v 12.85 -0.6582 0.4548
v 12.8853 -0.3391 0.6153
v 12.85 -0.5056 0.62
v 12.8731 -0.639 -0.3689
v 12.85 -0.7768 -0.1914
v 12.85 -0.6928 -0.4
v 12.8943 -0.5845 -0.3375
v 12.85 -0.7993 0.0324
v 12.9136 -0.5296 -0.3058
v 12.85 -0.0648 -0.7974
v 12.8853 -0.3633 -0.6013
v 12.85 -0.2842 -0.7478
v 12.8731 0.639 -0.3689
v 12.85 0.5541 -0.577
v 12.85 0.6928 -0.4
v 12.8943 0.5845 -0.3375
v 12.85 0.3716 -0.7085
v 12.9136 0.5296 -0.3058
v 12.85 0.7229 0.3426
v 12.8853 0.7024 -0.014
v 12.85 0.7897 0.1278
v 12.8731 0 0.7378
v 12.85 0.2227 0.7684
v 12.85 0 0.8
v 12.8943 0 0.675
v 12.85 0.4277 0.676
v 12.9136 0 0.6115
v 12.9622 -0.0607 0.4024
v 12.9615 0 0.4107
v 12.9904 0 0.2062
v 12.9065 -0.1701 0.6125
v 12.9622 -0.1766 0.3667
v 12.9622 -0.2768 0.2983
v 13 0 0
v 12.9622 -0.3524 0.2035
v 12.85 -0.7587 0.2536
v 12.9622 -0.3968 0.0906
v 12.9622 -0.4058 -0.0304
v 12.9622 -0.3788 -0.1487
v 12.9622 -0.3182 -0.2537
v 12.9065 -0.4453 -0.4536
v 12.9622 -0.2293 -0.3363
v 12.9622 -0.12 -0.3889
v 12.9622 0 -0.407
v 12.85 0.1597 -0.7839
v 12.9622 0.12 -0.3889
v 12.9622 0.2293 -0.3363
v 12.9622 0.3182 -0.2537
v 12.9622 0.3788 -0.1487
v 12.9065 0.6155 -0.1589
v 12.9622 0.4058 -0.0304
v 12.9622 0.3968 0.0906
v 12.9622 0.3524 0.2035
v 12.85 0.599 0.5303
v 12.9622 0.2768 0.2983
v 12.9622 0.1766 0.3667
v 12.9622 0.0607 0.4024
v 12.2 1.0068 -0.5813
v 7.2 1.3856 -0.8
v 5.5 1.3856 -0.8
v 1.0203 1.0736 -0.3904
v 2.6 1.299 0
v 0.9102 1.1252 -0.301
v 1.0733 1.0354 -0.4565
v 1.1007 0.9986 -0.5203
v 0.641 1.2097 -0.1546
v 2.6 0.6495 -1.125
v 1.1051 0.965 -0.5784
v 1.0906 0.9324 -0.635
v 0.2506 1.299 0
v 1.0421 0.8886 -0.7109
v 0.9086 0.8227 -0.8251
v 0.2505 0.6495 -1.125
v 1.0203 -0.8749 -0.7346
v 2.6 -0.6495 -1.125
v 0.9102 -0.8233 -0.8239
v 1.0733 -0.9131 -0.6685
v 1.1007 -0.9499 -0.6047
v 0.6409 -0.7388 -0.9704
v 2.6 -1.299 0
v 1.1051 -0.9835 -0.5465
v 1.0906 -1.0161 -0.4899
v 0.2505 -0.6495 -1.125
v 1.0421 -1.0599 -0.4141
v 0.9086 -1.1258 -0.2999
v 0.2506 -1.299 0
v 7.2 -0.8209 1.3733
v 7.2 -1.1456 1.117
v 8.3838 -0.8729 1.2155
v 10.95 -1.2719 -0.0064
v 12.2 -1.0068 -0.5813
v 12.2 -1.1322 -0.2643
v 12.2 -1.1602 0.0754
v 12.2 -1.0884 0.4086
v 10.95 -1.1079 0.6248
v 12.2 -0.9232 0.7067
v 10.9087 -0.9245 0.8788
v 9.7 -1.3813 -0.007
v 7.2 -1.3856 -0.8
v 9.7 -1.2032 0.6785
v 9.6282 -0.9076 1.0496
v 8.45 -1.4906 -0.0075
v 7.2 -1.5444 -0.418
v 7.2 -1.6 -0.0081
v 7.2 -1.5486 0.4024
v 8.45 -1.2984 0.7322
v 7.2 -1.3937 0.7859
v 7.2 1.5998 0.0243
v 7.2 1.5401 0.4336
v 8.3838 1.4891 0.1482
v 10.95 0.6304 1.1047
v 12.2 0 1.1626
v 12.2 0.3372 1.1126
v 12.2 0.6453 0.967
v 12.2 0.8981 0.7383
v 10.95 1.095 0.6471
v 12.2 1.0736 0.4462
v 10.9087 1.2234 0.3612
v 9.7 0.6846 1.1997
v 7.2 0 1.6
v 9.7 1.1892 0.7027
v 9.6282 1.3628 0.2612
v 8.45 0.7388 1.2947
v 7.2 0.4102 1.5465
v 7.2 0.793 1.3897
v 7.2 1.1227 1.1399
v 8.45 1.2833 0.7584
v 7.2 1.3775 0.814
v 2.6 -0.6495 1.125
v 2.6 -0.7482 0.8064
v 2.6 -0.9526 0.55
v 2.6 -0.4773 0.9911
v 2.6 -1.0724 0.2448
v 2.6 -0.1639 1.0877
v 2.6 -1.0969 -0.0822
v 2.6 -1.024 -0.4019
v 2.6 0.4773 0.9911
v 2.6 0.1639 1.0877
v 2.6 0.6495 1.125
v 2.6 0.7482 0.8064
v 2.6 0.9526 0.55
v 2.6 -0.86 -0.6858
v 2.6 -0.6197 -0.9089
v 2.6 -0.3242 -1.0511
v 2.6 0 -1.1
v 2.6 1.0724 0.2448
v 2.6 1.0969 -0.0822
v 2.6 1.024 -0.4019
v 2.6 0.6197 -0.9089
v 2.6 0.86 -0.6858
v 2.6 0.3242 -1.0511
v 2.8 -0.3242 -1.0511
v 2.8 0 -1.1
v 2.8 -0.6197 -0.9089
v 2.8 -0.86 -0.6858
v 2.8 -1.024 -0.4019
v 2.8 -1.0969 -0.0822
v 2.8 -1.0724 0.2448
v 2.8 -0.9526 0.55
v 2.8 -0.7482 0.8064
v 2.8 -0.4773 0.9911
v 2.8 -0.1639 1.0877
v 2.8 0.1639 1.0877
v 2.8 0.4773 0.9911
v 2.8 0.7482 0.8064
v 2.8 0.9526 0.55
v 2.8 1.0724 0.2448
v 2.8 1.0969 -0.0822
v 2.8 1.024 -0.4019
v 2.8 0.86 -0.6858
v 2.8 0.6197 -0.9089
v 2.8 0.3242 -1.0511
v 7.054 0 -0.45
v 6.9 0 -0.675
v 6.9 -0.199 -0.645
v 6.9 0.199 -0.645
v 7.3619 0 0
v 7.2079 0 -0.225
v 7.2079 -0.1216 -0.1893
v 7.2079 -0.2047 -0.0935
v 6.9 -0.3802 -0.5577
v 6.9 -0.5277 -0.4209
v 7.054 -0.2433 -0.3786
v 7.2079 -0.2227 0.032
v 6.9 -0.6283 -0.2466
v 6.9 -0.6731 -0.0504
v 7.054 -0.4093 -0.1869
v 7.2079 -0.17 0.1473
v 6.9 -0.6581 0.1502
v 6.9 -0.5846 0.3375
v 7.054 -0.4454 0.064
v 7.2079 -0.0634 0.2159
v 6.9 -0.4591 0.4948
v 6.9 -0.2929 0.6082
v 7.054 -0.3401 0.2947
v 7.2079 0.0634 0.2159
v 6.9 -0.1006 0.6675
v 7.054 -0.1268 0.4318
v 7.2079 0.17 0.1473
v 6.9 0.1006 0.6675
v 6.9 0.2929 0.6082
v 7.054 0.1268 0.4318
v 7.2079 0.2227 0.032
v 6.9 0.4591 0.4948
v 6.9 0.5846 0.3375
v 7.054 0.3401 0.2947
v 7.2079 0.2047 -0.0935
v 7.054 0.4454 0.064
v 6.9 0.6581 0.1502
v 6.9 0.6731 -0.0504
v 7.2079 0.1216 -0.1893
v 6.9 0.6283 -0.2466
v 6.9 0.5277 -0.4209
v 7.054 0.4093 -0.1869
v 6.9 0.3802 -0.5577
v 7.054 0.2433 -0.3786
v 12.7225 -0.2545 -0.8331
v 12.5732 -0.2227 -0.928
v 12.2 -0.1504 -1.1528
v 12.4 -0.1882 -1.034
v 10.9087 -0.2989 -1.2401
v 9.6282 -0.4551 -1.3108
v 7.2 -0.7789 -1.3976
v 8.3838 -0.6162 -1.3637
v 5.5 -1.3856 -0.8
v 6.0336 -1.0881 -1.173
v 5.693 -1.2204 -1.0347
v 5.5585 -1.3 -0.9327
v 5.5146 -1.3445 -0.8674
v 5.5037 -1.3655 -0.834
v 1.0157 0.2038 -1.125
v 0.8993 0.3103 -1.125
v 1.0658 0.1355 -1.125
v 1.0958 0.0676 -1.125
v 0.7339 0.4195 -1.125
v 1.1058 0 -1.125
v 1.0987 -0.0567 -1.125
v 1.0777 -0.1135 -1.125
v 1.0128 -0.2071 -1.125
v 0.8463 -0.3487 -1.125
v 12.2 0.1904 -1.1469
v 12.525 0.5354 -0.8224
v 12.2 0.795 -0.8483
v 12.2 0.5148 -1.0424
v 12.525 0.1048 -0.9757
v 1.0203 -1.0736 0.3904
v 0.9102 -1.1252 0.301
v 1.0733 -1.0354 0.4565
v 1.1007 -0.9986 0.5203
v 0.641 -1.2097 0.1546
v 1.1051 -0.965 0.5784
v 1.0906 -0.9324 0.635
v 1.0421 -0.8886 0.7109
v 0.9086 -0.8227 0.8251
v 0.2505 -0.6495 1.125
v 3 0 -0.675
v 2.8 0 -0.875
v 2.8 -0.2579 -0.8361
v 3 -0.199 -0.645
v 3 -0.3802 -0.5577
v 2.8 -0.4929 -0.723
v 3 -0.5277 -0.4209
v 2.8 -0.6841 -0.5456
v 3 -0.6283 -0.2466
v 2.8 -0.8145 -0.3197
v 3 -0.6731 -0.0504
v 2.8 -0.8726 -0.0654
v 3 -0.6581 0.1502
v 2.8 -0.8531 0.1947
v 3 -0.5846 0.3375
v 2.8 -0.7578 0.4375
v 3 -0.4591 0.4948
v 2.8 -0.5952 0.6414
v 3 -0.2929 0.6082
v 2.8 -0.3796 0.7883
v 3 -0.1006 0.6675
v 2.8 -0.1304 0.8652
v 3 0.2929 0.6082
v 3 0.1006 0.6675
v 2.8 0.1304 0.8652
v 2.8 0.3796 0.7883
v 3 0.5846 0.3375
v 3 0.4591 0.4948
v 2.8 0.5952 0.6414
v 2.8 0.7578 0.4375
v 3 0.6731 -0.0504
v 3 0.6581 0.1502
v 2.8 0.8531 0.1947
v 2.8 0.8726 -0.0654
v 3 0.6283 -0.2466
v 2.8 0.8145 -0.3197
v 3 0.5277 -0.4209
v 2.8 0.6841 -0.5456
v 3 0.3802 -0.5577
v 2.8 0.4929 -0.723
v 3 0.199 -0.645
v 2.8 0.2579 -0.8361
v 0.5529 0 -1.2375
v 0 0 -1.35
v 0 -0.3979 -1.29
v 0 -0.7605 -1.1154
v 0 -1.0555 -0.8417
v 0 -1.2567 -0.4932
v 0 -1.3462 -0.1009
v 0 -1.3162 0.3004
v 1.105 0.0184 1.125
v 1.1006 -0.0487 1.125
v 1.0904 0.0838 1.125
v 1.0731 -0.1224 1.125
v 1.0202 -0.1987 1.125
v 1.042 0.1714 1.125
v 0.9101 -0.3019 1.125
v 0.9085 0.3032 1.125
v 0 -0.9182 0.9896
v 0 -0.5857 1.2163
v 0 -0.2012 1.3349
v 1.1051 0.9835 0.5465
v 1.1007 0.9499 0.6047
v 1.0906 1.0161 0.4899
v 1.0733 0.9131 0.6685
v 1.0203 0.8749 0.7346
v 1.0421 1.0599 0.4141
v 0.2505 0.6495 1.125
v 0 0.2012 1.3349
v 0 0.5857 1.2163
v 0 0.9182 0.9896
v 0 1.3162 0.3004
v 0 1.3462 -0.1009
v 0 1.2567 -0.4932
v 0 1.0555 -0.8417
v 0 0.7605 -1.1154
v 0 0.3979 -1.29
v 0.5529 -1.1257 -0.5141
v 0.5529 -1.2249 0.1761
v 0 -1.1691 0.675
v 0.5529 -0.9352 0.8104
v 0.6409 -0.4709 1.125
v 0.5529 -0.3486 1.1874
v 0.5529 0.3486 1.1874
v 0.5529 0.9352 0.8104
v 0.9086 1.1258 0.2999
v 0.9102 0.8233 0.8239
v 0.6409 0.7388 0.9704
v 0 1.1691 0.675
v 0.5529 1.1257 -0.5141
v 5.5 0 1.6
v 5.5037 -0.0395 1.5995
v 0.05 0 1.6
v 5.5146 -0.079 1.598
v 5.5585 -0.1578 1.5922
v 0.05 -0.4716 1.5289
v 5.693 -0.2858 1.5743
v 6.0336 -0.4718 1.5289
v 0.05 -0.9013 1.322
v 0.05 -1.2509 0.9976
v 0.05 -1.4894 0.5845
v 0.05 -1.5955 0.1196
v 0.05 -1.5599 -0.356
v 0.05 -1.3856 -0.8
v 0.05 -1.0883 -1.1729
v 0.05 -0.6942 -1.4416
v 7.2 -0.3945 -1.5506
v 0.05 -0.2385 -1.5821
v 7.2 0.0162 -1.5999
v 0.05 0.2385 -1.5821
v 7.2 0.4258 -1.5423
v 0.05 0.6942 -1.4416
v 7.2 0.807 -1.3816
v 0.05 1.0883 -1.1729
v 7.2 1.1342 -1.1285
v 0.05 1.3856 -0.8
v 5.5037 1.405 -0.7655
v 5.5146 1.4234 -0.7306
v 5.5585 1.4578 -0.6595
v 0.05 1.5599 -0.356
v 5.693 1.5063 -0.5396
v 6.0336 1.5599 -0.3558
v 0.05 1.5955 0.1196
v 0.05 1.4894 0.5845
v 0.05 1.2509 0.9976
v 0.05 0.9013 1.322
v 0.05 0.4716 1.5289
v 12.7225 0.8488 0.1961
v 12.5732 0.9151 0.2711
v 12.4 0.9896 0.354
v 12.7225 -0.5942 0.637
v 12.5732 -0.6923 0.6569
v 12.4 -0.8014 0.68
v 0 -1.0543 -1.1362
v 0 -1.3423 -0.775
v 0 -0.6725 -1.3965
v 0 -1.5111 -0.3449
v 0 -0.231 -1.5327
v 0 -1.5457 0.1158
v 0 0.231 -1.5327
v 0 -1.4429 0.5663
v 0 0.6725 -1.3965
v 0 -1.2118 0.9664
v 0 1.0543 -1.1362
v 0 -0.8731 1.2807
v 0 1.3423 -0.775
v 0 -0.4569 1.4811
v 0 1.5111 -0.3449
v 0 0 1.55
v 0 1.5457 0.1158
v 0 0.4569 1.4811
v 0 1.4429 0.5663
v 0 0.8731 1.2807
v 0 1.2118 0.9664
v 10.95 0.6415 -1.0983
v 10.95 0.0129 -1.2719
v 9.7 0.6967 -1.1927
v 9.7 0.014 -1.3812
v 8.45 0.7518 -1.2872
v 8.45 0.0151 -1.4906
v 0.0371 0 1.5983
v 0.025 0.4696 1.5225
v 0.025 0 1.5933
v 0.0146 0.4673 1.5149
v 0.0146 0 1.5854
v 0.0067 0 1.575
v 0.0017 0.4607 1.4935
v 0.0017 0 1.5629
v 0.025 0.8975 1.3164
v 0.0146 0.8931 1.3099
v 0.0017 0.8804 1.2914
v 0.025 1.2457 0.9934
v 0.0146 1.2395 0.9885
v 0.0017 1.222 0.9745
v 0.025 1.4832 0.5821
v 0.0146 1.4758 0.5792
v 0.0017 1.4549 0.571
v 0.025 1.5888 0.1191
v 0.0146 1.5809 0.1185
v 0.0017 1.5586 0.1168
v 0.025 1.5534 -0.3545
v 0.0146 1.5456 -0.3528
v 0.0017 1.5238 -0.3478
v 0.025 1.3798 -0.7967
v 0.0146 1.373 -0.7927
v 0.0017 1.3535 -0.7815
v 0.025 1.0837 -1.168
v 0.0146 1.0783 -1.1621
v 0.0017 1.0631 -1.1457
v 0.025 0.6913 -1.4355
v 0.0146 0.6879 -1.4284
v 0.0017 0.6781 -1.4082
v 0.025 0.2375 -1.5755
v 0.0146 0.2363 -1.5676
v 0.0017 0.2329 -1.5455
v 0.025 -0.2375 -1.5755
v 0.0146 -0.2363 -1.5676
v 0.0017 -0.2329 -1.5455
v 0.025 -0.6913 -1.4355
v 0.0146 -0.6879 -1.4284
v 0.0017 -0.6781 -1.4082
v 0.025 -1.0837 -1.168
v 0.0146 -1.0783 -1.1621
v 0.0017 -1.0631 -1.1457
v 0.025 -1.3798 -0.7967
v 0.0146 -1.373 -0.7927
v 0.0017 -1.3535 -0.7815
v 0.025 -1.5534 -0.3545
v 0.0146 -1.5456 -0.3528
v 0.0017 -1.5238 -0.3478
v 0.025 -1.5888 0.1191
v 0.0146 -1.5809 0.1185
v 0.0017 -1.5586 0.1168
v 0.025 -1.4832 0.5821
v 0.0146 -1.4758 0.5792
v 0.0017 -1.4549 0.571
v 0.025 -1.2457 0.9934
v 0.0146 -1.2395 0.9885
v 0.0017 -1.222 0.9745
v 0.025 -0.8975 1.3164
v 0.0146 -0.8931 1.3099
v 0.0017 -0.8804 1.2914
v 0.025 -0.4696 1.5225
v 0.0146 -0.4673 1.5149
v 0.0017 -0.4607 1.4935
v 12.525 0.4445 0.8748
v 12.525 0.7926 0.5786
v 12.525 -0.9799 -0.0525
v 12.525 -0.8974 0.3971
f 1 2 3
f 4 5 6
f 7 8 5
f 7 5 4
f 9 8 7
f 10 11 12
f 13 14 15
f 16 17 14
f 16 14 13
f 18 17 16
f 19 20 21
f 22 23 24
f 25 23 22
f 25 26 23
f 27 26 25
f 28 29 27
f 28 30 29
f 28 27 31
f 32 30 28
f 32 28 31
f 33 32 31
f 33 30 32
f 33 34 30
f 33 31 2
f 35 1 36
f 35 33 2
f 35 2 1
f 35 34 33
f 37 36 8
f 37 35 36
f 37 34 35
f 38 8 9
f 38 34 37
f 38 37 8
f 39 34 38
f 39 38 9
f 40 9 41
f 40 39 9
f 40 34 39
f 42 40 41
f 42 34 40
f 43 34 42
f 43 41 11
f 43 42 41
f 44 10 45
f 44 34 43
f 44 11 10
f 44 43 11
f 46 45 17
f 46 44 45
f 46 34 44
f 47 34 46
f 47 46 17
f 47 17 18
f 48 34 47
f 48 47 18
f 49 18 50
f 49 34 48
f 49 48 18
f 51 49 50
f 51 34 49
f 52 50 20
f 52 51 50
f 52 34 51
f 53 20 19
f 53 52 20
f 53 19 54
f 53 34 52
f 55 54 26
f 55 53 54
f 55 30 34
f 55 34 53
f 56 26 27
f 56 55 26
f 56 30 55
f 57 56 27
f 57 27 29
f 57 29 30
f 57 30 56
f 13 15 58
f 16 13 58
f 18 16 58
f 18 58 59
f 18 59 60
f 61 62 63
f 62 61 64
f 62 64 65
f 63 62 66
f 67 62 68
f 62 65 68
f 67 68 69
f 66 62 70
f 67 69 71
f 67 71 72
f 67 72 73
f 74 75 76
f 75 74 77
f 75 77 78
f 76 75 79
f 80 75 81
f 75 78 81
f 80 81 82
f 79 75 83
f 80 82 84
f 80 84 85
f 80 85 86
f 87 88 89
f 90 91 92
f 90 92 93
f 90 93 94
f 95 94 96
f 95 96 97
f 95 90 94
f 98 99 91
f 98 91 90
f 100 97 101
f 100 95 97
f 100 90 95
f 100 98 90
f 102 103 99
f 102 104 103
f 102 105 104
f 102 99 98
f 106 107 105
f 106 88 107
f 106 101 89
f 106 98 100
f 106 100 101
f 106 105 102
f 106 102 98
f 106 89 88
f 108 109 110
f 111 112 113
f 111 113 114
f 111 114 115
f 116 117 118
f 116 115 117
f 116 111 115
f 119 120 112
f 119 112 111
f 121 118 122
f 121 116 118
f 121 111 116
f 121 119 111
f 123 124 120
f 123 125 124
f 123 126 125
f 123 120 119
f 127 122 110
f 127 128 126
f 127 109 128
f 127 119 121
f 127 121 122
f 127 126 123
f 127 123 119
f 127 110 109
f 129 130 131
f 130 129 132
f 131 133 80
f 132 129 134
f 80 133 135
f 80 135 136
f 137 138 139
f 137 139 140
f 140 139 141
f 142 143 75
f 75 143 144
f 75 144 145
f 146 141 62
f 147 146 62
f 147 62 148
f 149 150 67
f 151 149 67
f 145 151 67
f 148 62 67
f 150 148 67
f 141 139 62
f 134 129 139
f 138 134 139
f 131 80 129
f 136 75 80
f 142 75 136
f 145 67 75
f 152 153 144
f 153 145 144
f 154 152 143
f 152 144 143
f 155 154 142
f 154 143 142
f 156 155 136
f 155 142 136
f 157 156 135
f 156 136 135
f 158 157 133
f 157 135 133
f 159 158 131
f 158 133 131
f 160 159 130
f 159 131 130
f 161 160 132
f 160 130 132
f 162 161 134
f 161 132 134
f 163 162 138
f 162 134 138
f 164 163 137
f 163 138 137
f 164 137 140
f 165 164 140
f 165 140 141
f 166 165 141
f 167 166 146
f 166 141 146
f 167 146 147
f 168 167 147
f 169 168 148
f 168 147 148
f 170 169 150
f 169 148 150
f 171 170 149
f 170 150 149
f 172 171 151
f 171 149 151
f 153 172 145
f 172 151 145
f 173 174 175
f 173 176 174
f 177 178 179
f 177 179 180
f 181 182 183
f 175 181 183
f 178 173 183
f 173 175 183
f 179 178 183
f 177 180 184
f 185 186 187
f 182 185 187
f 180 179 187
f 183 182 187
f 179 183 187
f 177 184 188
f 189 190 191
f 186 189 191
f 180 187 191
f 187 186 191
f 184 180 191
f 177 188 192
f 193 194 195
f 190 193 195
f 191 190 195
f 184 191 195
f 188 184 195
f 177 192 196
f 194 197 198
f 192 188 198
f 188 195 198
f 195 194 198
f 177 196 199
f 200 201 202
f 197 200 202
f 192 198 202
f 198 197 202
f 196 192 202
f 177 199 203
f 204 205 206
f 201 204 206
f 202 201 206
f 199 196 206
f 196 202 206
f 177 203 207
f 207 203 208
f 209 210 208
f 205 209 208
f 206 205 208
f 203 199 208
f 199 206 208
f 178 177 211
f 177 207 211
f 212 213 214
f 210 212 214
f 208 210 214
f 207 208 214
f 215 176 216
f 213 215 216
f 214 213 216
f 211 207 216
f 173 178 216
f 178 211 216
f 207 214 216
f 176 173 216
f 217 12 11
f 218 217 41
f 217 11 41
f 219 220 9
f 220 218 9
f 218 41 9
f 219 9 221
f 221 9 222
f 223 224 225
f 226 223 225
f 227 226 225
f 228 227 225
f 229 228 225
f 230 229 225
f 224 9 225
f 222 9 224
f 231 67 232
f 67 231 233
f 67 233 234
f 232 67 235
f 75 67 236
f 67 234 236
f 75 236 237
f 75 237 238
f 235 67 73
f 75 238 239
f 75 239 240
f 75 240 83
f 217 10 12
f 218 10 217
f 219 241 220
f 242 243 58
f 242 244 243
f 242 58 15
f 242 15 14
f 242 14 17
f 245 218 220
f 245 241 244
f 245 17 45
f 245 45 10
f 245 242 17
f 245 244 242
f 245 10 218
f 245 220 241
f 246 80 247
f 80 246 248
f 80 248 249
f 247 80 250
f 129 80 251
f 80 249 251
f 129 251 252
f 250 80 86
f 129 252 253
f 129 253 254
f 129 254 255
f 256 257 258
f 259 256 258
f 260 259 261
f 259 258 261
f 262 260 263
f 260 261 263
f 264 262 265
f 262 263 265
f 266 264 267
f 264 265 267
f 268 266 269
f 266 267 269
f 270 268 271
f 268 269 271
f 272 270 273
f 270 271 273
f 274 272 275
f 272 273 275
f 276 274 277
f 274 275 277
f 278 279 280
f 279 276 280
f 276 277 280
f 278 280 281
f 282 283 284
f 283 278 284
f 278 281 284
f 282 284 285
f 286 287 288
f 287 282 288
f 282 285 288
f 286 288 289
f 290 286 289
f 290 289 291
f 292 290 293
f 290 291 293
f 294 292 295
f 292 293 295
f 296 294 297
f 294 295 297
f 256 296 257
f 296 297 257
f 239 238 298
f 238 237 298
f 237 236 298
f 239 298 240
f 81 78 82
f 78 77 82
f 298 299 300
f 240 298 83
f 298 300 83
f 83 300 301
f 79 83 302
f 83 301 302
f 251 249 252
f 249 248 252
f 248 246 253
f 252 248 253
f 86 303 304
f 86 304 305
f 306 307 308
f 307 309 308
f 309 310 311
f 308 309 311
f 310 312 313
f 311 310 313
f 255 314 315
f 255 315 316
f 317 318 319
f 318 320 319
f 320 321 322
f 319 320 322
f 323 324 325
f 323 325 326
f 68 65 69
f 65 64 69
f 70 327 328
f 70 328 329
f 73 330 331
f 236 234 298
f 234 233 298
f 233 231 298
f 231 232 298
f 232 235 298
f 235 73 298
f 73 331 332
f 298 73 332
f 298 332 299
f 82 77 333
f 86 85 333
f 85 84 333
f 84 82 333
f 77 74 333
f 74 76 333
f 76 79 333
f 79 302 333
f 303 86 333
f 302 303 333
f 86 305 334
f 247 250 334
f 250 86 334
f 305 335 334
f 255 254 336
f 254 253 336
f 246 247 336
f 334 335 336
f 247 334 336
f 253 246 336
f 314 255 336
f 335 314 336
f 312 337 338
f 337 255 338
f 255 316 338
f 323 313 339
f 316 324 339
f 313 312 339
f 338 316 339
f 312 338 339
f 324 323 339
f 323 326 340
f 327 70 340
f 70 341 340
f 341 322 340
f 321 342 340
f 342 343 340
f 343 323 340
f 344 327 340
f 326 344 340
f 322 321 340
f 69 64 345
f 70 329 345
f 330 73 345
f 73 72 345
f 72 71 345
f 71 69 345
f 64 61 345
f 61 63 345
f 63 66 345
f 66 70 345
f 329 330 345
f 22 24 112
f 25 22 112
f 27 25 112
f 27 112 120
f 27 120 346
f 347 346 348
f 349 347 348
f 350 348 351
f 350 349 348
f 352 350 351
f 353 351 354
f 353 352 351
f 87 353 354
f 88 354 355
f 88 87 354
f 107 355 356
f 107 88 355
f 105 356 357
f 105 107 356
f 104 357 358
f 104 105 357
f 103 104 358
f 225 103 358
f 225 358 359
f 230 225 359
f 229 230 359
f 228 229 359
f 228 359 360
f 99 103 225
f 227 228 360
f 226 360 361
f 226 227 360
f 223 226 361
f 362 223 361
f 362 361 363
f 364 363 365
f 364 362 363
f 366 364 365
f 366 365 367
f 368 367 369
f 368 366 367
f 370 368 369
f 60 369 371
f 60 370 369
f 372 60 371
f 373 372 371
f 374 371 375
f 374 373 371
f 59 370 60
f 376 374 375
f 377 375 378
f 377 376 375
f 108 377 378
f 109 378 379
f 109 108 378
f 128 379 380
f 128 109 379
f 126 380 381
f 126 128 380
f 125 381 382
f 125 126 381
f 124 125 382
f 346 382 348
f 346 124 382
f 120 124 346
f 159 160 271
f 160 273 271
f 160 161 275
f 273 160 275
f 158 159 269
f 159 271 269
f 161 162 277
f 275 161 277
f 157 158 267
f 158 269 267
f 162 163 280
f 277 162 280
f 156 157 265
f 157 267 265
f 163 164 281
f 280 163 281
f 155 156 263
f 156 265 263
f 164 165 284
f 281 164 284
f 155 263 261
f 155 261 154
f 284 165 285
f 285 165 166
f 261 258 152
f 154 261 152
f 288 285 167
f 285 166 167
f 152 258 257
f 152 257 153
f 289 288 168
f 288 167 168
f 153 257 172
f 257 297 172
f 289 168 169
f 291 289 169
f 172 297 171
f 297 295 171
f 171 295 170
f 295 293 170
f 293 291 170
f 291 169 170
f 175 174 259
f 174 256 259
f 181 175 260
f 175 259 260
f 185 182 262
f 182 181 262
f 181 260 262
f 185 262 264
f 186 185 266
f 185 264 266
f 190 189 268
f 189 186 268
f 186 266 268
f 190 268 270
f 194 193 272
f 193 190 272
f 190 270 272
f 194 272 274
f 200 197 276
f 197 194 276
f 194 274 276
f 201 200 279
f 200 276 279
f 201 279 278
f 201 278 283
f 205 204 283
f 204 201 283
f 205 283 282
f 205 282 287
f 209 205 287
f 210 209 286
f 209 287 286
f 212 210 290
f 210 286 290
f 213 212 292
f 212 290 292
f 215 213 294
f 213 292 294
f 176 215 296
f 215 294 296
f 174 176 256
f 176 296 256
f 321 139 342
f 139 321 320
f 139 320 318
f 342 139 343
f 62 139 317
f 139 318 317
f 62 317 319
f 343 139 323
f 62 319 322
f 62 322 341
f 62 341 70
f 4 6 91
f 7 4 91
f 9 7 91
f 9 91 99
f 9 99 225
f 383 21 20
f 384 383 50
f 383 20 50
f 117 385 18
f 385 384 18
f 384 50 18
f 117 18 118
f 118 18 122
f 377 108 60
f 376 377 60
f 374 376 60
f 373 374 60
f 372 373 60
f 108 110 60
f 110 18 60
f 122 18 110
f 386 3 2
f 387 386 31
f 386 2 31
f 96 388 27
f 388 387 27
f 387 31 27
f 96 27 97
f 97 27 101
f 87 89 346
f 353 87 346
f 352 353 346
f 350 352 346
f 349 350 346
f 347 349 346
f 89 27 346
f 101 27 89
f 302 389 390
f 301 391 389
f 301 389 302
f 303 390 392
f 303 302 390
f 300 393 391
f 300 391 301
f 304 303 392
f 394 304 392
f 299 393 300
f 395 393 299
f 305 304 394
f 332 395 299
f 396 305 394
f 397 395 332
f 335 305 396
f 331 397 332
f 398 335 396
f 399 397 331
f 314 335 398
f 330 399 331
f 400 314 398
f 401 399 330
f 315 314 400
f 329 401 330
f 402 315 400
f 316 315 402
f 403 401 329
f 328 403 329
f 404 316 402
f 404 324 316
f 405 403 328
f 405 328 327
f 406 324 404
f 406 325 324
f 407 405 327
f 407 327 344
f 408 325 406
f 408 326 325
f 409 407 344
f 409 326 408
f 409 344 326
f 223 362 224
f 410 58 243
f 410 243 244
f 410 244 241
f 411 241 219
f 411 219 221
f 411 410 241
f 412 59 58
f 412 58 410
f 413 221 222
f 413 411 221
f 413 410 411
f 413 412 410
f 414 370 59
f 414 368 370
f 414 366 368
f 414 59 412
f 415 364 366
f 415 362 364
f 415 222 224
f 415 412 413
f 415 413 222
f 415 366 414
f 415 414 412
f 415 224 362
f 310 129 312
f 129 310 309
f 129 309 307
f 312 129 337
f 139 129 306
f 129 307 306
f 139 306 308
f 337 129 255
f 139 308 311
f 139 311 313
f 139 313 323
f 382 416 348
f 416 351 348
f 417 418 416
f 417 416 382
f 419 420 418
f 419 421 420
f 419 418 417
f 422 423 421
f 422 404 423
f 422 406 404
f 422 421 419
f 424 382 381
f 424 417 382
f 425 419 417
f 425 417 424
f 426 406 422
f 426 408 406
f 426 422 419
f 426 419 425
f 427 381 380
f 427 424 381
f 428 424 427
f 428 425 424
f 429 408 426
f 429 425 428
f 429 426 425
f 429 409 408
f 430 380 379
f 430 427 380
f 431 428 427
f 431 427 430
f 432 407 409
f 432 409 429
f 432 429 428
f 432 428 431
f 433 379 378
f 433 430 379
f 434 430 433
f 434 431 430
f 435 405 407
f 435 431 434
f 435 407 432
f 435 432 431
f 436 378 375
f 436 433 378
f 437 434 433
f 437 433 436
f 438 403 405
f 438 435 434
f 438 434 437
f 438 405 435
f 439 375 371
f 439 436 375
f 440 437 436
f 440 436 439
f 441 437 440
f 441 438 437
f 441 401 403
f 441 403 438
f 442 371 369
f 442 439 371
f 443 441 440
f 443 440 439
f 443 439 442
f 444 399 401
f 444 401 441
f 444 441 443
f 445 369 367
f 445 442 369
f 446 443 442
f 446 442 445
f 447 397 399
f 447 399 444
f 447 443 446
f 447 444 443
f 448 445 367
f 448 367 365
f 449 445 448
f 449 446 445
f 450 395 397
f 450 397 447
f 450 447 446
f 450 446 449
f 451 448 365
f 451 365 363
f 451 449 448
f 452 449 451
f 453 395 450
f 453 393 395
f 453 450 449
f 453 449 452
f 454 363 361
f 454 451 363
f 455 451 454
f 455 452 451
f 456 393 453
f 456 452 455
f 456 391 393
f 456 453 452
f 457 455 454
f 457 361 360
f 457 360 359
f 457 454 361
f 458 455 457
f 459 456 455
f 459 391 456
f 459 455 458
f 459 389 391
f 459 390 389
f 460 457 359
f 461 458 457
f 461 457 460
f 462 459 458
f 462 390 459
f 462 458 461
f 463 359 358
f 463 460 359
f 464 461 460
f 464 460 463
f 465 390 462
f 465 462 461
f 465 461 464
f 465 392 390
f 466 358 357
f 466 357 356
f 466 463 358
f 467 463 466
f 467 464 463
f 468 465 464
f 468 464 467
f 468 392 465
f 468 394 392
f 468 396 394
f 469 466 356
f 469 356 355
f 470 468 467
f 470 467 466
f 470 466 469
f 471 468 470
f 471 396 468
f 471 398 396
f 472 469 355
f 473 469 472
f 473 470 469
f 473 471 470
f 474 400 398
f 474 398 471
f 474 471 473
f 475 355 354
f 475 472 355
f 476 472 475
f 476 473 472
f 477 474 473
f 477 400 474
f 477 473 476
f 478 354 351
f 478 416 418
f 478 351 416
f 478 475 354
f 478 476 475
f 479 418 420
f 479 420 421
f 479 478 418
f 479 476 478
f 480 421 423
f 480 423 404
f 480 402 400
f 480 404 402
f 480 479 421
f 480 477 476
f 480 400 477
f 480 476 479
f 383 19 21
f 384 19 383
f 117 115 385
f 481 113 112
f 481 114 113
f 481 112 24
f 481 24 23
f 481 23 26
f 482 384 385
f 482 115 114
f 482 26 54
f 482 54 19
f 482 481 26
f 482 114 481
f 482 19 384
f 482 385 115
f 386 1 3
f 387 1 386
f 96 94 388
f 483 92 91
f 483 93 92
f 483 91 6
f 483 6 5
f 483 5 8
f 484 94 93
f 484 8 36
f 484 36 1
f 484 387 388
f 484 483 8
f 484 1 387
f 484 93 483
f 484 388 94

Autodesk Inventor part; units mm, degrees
ref_plane "YZ Plane" through (0, 0, 0) normal (1, 0, 0) x (0, 1, 0)
ref_plane "XZ Plane" through (0, 0, 0) normal (0, 1, 0) x (-1, 0, 0)
ref_plane "XY Plane" through (0, 0, 0) normal (0, 0, 1) x (1, 0, 0)
sketch "Sketch1" plane through (0, 0, 0) normal (0, 1, 0) x (-1, 0, 0)
  line L0 (0, 0) -> (0, 1.6)
  line L1 (0, 1.6) -> (-7.2, 1.6)
  line L2 (-7.2, 1.6) -> (-12.2, 1.1626)
  line L3 (-12.7, 0.8837) -> (-12.7, 0)
  line L4 (-12.7, 0) -> (0, 0)
  line L5 (-12.7, 0) -> (-13, 0)
  line L6 (-12.2, 0) -> (-12.2, 1.1626)
  line L7 (-12.2, 1.1626) -> (-12.85, 0.8)
  line L8 (-12.2, -1.1626) -> (-12.85, -0.8)
  arc A0 (-12.85, 0.8) -> (-12.85, -0.8) centre (-10.7917, 0) ccw
  dimension "d0" = 1.6
  dimension "d1" = 7.2
  dimension "d3" = 12.7
  dimension "d4" = 0.3
  dimension "d352" = 0.8
  dimension "d353" = 0.8
  dimension "d355" = 0.65
  dimension "d359" = 5
  dimension "d373" = 60.848
revolve "Revolution1" add sketch "Sketch1" angle 360 about axis through (12.7, 0, 0) along (-1, 0, 0)
sketch "Sketch2" plane through (0, 0, 0) normal (0, 1, 0) x (-1, 0, 0)
  line L0 (0, -1.35) -> (0, 0)
  line L1 (0, 0) -> (-6.9, 0)
  line L2 (-6.9, 0) -> (-6.9, -0.675)
  line L3 (-6.9, -0.675) -> (-2.8, -0.675)
  line L4 (-2.8, -0.675) -> (-2.8, -1.1)
  line L5 (-2.8, -1.1) -> (-1.35, -1.1)
  line L6 (-1.35, -1.1) -> (-1.35, -1.0753)
  line L7 (-1.35, -1.0753) -> (0, -1.35)
  line L8 (-6.9, -0.675) -> (-7.3619, 0)
  line L9 (-7.3619, 0) -> (-6.9, 0) construction
  line L10 (-7.3619, 0) -> (-6.9, 0)
  line L11 (0, 0) -> (0, -1.425)
  line L12 (0, -1.6) -> (0, 1.6)
  line L13 (0, -1.425) -> (0.3686, -1.425)
  dimension "d9" = 1.1
  dimension "d11" = 1.35
  dimension "d12" = 11.5
  dimension "d145" = 0.4619
  dimension "d284" = 1.45
  dimension "d293" = 1.35
  dimension "d361" = 1.425
  dimension "d363" = 0.3686
  dimension "d367" = 6.9
  dimension "d374" = 0.675
revolve "Revolution2" cut sketch "Sketch2" angle 360 about axis through (0, 0, 0) along (1, 0, 0)
sketch "Sketch3" plane through (1.35, 0, 0) normal (1, 0, 0) x (0, 0, -1)
  line L0 (0, 1.299) -> (1.125, 0.6495)
  line L1 (1.125, 0.6495) -> (1.125, -0.6495)
  line L2 (1.125, -0.6495) -> (0, -1.299)
  line L3 (0, -1.299) -> (-1.125, -0.6495)
  line L4 (-1.125, -0.6495) -> (-1.125, 0.6495)
  line L5 (-1.125, 0.6495) -> (0, 1.299)
  point P0 (0, 0)
  point P1 (0, 0)
  dimension "d20" = 0
  dimension "d21" = 2.25
extrude "Extrusion1" cut sketch "Sketch3" along normal blind 1.25 and the other way blind 2
fillet "Fillet1" radius 0.05 1 edges at (0, 0, -1.6)
sketch "Sketch10" plane through (0, 0, 0) normal (0, 1, 0) x (-1, 0, 0)
  circle A0 centre (-1.8, 1.5) radius 0.1
  line L0 (-0.5216, -1.4433) -> (-0.46, -1.55)
  line L1 (-0.46, -1.55) -> (-0.6332, -1.55)
  line L2 (-0.6332, -1.55) -> (-0.5716, -1.4433)
  line L3 (-0.5216, -1.4433) -> (-0.5716, -1.4433)
  line L4 (0, 1.55) -> (0, -1.55)
  point P0 (0, 0)
  point P1 (-0.5466, -1.5)
  point P2 (-0.5466, -1.4)
  dimension "d69" = 0.2
  dimension "d70" = 1.5
  dimension "d71" = 1.8
  dimension "d232" = 0.15
  dimension "d233" = 0.05
  dimension "d234" = 0.05
  dimension "d235" = 0.46
  dimension "d236" = 1.55
  dimension "d237" = 1.55
sketch "Sketch24" plane through (0, 0, 0) normal (0, 1, 0) x (-1, 0, 0)
  line L0 (-2.0692, 1.4443) -> (-2.5292, 1.4)
  line L1 (-2.5292, 1.4) -> (-3.1116, 2.2165)
  line L2 (-3.1116, 2.2165) -> (-2, 2.3235)
  line L3 (-2, 2.3235) -> (-2.0692, 1.4443)
  line L4 (-2.6, -1.125) -> (-0.2505, -1.125)
  line L5 (0, 1.35) -> (0, -1.35)
  point P0 (0, 0)
  point P1 (-0.3734, 1.125)
  point P2 (-2.65, 1.125)
  point P3 (-0.2505, -1.125)
  dimension "d167" = 60
  dimension "d170" = 2
  dimension "d171" = 100
  dimension "d357" = 0.8685
  dimension "d358" = 0.46
  dimension "d370" = 1.4
  dimension "d371" = 84.5
coil "Coil12" [suppressed]
coil "Coil16" [suppressed]
sketch "Sketch41" plane through (2.0889, 1.4266, -0.4635) normal (0, -0.309, -0.9511) x (1, 0, 0)
  line L0 (0.1155, 0) -> (0.0827, 0.0567)
  line L1 (0.0827, 0.0567) -> (0.0327, 0.0567)
  line L2 (-0.4173, 0.0567) -> (-0.4673, 0.0567)
  line L3 (-0.9173, 0.0567) -> (-0.9673, 0.0567)
  line L4 (-1.4173, 0.0567) -> (-1.4673, 0.0567)
  line L5 (-1.2173, 2.9433) -> (-1.1673, 2.9433)
  line L6 (-0.7173, 2.9433) -> (-0.6673, 2.9433)
  line L7 (-0.2173, 2.9433) -> (-0.1673, 2.9433)
  arc A0 (-2.0889, 0.05) -> (-2.0389, 0) centre (-2.0389, 0.05) ccw
  line L8 (-2.0889, 0.05) -> (-2.0889, 0.15)
  line L9 (-2.0889, 0.15) -> (-1.1065, 0.3499)
  line L10 (4.8111, 0.7) -> (5.273, 1.5)
  line L11 (5.273, 1.5) -> (4.8111, 2.3)
  line L12 (-1.1065, 2.6501) -> (-2.0889, 2.85)
  line L13 (-2.0889, 2.85) -> (-2.0889, 2.95)
  arc A1 (-2.0389, 3) -> (-2.0889, 2.95) centre (-2.0389, 2.95) ccw
  line L14 (4.8111, 2.3) -> (0.7111, 2.3)
  line L15 (0.7111, 0.7) -> (4.8111, 0.7)
  line L16 (0.7111, 2.3) -> (0.7111, 2.6)
  line L17 (0.5111, 0.4) -> (0.7111, 0.4)
  line L18 (0.7111, 2.6) -> (0.5111, 2.6)
  line L19 (0.7111, 0.4) -> (0.7111, 0.7)
  line L20 (0, 0) -> (-0.3845, 0)
  line L21 (0.0327, 0.0567) -> (0, 0)
  line L22 (0.1155, 0) -> (0, 0)
  line L23 (0.5111, 0.3499) -> (0.5111, 0.4)
  line L24 (0.5111, 2.6) -> (0.5111, 2.6501)
  arc A2 (9.2611, 0.6) -> (9.2611, 2.4) centre (6.6361, 1.5) ccw
  line L25 (0.5111, 2.6501) -> (-1.1065, 2.6501)
  line L26 (4.9111, 0) -> (0.1155, 0)
  line L27 (-1.1065, 0.3499) -> (0.5111, 0.3499)
  line L28 (9.2611, 0.6) -> (8.6111, 0.3237)
  line L29 (8.6111, 0.3237) -> (4.9111, 0)
  line L30 (-0.5, 0) -> (-0.8845, 0)
  line L31 (-1, 0) -> (-1.3845, 0)
  line L32 (-1.5, 0) -> (-2.0389, 0)
  line L33 (-2.0389, 3) -> (-1.25, 3)
  line L34 (-1.1345, 3) -> (-0.75, 3)
  line L35 (-0.6345, 3) -> (-0.25, 3)
  line L36 (-0.1345, 3) -> (4.9111, 3)
  line L37 (4.9111, 3) -> (8.6111, 2.6763)
  line L38 (8.6111, 2.6763) -> (9.2611, 2.4)
  point P0 (-2.0889, 1.5)
  point P1 (0.04, 2.55)
  point P2 (0.04, 0.95)
  point P3 (2.4363, -2.336)
  point P4 (2.2646, -2.336)
  point P5 (1.6424, -2.336)
  point P6 (1.4156, -2.336)
  point P7 (0.8485, -2.336)
  point P8 (0.5666, -2.336)
  point P9 (0.14, 0.3317)
  point P10 (0.14, 2.6683)
  point P11 (-0.69, 0)
  point P12 (-0.5168, 0)
  point P13 (-1.15, 0)
  point P14 (0.0554, 3.4951)
  point P15 (0.4369, 3.5)
  point P16 (5.5075, 3.4591)
  point P17 (9.4087, 0.8232)
  point P18 (9.1185, 0.3568)
  point P19 (9.1075, 0.3559)
  point P20 (8.3185, 0.2868)
  point P21 (8.3075, 0.2859)
  point P22 (7.5185, 0.2168)
  point P23 (7.5075, 0.2159)
  point P24 (6.7185, 0.1469)
  point P25 (6.7075, 0.1459)
  point P26 (5.9185, 0.0769)
  point P27 (5.9075, 0.0759)
  point P28 (5.1185, 0.0069)
  point P29 (5.1075, 0.0059)
  point P30 (0, 0.0001)
  point P31 (10.24, 3.1065)
  point P32 (9.9229, 0.3686)
  point P33 (9.8272, 0.361)
  point P34 (9.1222, 0.3055)
  point P35 (9.0317, 0.2984)
  point P36 (8.3215, 0.2425)
  point P37 (8.2362, 0.2358)
  point P38 (7.5207, 0.1795)
  point P39 (7.4407, 0.1732)
  point P40 (6.72, 0.1165)
  point P41 (6.6452, 0.1106)
  point P42 (5.9192, 0.0535)
  point P43 (5.8497, 0.048)
  point P44 (5.1195, 0)
  point P45 (5.0443, 0)
  point P46 (4.2066, 0)
  point P47 (3.5312, 0)
  point P48 (3.3689, 0)
  point P49 (2.7371, 0)
  point P50 (2.5311, 0)
  point P51 (1.943, 0)
  point P52 (1.6934, 0)
  point P53 (1.1489, 0)
  point P54 (0.8557, 0)
  point P55 (10.3292, 3.0438)
  point P56 (10.225, 3.1077)
  point P57 (9.5226, 3.163)
  point P58 (9.4295, 3.1703)
  point P59 (8.7218, 3.226)
  point P60 (8.634, 3.2329)
  point P61 (7.9211, 3.289)
  point P62 (7.8385, 3.2955)
  point P63 (7.1203, 3.352)
  point P64 (7.043, 3.3581)
  point P65 (6.3196, 3.415)
  point P66 (6.2475, 3.4207)
  point P67 (5.5189, 3.4781)
  point P68 (5.4519, 3.4833)
  point P69 (4.7224, 3.5)
  point P70 (4.6255, 3.5)
  point P71 (3.9283, 3.5)
  point P72 (3.7877, 3.5)
  point P73 (3.1342, 3.5)
  point P74 (2.95, 3.5)
  point P75 (2.3401, 3.5)
  point P76 (2.1123, 3.5)
  point P77 (1.5459, 3.5)
  point P78 (1.2745, 3.5)
  point P79 (0.7518, 3.5)
  point P80 (0.4368, 3.5)
  point P81 (0.0559, 3.4961)
  point P82 (-0.0003, 0)
  point P83 (1.2685, 3)
  point P84 (0.6925, 3)
  point P85 (2.1062, 3)
  point P86 (2.9439, 3)
  point P87 (1.4866, 3)
  point P88 (3.7817, 3)
  point P89 (2.2807, 3)
  point P90 (3.0748, 3)
  point P91 (4.6194, 3)
  point P92 (3.8689, 3)
  point P93 (4.6631, 3)
  point P94 (9.3294, 0.7244)
  point P95 (8.9446, 0.4186)
  point P96 (5.4339, 2.9655)
  point P97 (5.461, 2.9636)
  point P98 (6.2339, 2.9095)
  point P99 (6.261, 2.9076)
  point P100 (7.0339, 2.8536)
  point P101 (7.061, 2.8517)
  point P102 (7.8339, 2.7976)
  point P103 (7.861, 2.7957)
  point P104 (8.6339, 2.7417)
  point P105 (8.261, 0.2322)
  point P106 (7.461, 0.1763)
  point P107 (8.2339, 0.2303)
  point P108 (6.661, 0.1203)
  point P109 (7.4339, 0.1744)
  point P110 (5.861, 0.0644)
  point P111 (6.6339, 0.1184)
  point P112 (5.061, 0.0085)
  point P113 (5.8339, 0.0625)
  point P114 (9.0823, 0.491)
  point P115 (-0.7468, 0)
  point P116 (5.0339, 0.0066)
  point P117 (-1.2068, 0)
  point P118 (0.1351, 3)
  point P119 (0.9307, 3)
  point P120 (0.6796, 3)
  point P121 (1.5195, 3)
  point P122 (1.7263, 3)
  point P123 (2.3594, 3)
  point P124 (2.5219, 3)
  point P125 (3.1993, 3)
  point P126 (3.3175, 3)
  point P127 (4.0392, 3)
  point P128 (4.113, 3)
  point P129 (5.6716, 2.9335)
  point P130 (5.7097, 2.9301)
  point P131 (6.4622, 2.8643)
  point P132 (6.5109, 2.86)
  point P133 (7.2527, 2.7951)
  point P134 (7.312, 2.79)
  point P135 (8.0433, 2.726)
  point P136 (8.1131, 2.7199)
  point P137 (8.7927, 2.5991)
  point P138 (8.9225, 2.5439)
  point P139 (9.115, 0.5379)
  point P140 (8.5136, 0.3152)
  point P141 (8.4386, 0.3086)
  point P142 (7.7125, 0.2451)
  point P143 (7.648, 0.2394)
  point P144 (6.9114, 0.175)
  point P145 (6.8574, 0.1703)
  point P146 (6.1103, 0.1049)
  point P147 (6.0669, 0.1011)
  point P148 (5.3092, 0.0348)
  point P149 (5.2763, 0.0319)
  point P150 (4.9086, 3)
  point P151 (4.8791, 3)
extrude "Extrusion19" [suppressed]
sketch "Sketch45" plane through (0, 0, 0) normal (0, 1, 0) x (-1, 0, 0)
  point P0 (0, 0)
sketch "Sketch47" plane through (0, 0, 0) normal (0, 0, 1) x (1, 0, 0)
  line L0 (0, -1.35) -> (0.2505, -1.299)
  line L1 (6.9, -0.675) -> (7.3619, 0)
  line L2 (7.3619, 0) -> (6.9, 0.675)
  line L3 (0.2505, 1.299) -> (0, 1.35)
  line L4 (6.9, 0.675) -> (2.8, 0.675)
  line L5 (2.8, -0.675) -> (6.9, -0.675)
  arc A0 (0, -1.55) -> (0.05, -1.6) centre (0.05, -1.55) ccw
  line L6 (0, -1.55) -> (0, -1.35)
  line L7 (0, 1.35) -> (0, 1.55)
  arc A1 (0.05, 1.6) -> (0, 1.55) centre (0.05, 1.55) ccw
  line L8 (0.2505, -1.299) -> (2.6, -1.299)
  line L9 (2.6, -1.299) -> (2.6, -1.1)
  line L10 (2.6, 1.1) -> (2.6, 1.299)
  line L11 (2.6, 1.299) -> (0.2505, 1.299)
  line L12 (2.6, -1.1) -> (2.8, -1.1)
  line L13 (2.8, -1.1) -> (2.8, -0.675)
  line L14 (2.8, 0.675) -> (2.8, 1.1)
  line L15 (2.8, 1.1) -> (2.6, 1.1)
  line L16 (12.2, 1.1626) -> (12.85, 0.8)
  arc A2 (12.85, -0.8) -> (12.85, 0.8) centre (10.7917, 0) ccw
  line L17 (12.85, -0.8) -> (12.2, -1.1626)
  line L18 (12.2, -1.1626) -> (7.2, -1.6)
  line L19 (7.2, -1.6) -> (0.05, -1.6)
  line L20 (0.05, 1.6) -> (7.2, 1.6)
  line L21 (7.2, 1.6) -> (12.2, 1.1626)
  point P0 (0, 0)
  point P1 (7.012, 0)
sketch "Sketch9" plane through (0, 0, 0) normal (0, 1, 0) x (-1, 0, 0)
  line L0 (0, 1.35) -> (0, -1.35)
  line L1 (0, -1.6) -> (0, 1.6)
  line L2 (-14.5, 1.6) -> (-5.5, 1.6)
  line L3 (-7.2, 1.6) -> (0, 1.6)
  line L4 (-14.5, 1.6) -> (-14.5, 0.4)
  line L5 (-14.5, 0.4) -> (-5.5, 1.6)
  point P0 (0, 0)
  dimension "d257" = 1.2
  dimension "d258" = 5.5
  dimension "d262" = 9
extrude "Extrusion4" cut sketch "Sketch9" against normal blind 2
pattern_circular "Circular Pattern1" count 3 over 360 about axis through (-10, 0, 0) along (1, 0, 0) of "Extrusion4"
sketch "Sketch50" plane through (0, 0, 0) normal (0, 1, 0) x (-1, 0, 0)
  line L0 (-2.8, 0.675) -> (-6.9, 0.675)
  line L1 (-6.9, 0.675) -> (-7.3619, 0)
  line L2 (-6.9, -0.675) -> (-2.8, -0.675)
  arc A0 (-0.05, -1.6) -> (0, -1.55) centre (-0.05, -1.55) ccw
  arc A1 (0, 1.55) -> (-0.05, 1.6) centre (-0.05, 1.55) ccw
  line L3 (-0.05, -1.6) -> (-7.2, -1.6)
  line L4 (-1.1059, -1.125) -> (0, -1.35)
  line L5 (0, -1.35) -> (0, -1.55)
  line L6 (0, 1.55) -> (0, 1.35)
  line L7 (0, 1.35) -> (-1.1059, 1.125)
  line L8 (-2.6, -1.125) -> (-1.1059, -1.125)
  line L9 (-1.1059, 1.125) -> (-2.6, 1.125)
  line L10 (-2.6, 1.125) -> (-2.6, 1.1)
  line L11 (-2.6, -1.1) -> (-2.6, -1.125)
  line L12 (-2.8, -0.675) -> (-2.8, -1.1)
  line L13 (-2.8, -1.1) -> (-2.6, -1.1)
  line L14 (-2.6, 1.1) -> (-2.8, 1.1)
  line L15 (-2.8, 1.1) -> (-2.8, 0.675)
  line L16 (-7.3619, 0) -> (-6.9, -0.675)
  line L17 (-5.5, 1.6) -> (-0.05, 1.6)
  line L18 (-12.9136, 0.6115) -> (-5.5, 1.6)
  line L19 (-7.2, -1.6) -> (-12.2, -1.1626)
  line L20 (-12.85, 0.8) -> (-12.2, 1.1626)
  line L21 (-12.2, 1.1626) -> (-7.2, 1.6)
  line L22 (-7.2, 1.6) -> (-5.5, 1.6)
  line L23 (-12.2, -1.1626) -> (-12.85, -0.8)
  arc A2 (-12.9136, 0.6115) -> (-12.85, -0.8) centre (-10.7917, 0) ccw
  arc A3 (-12.85, 0.8) -> (-12.9136, 0.6115) centre (-10.7917, 0) ccw
  point P0 (0, 0)
  point P1 (-1.4382, 1.75)
  point P2 (-1.495, 1.75)
  point P3 (-1.6682, 1.75)
  point P4 (-6.2041, 1.75)
  point P5 (-11.5804, 0.9405)
  point P6 (-2.2986, 1.75)
  point P7 (-5.8766, -1.75)
  point P8 (-6.6717, -1.75)
  point P9 (-7.4687, -1.7289)
  point P10 (-10.5666, -1.2193)
  point P11 (-10.7, -0.8888)
  point P12 (-3.5, -1.3923)
  point P13 (-4.3, -1.3364)
  point P14 (-5.1, -1.2804)
  point P15 (-5.9, -1.2245)
  point P16 (-6.7, -1.1685)
  point P17 (-7.5, -1.1126)
  point P18 (-2.3, 1.4762)
  point P19 (-3.1, 1.4203)
  point P20 (-3.9, 1.3643)
  point P21 (-4.7, 1.3084)
  point P22 (-5.5, 1.2524)
  point P23 (-6.3, 1.1965)
  point P24 (-7.1, 1.1406)
  point P25 (-7.9, 1.0846)
  point P26 (-8.7, 1.0287)
  point P27 (-6.2532, 1.5)
  point P28 (-3.5, -1.3923)
  point P29 (-7.4513, -1.4231)
  point P30 (-8.2513, -1.3601)
  point P31 (-9.0513, -1.2971)
  point P32 (-8.3929, 1.3781)
sketch "Sketch51" plane through (0, 0, 0) normal (0, 0, 1) x (1, 0, 0)
  line L0 (0, -1.35) -> (0.2505, -1.299)
  line L1 (6.9, -0.675) -> (7.3619, 0)
  line L2 (7.3619, 0) -> (6.9, 0.675)
  line L3 (0.2505, 1.299) -> (0, 1.35)
  line L4 (0.05, 1.6) -> (7.1077, 1.6)
  line L5 (0, 1.35) -> (0, 1.55)
  arc A0 (0.05, 1.6) -> (0, 1.55) centre (0.05, 1.55) ccw
  arc A1 (0, -1.55) -> (0.05, -1.6) centre (0.05, -1.55) ccw
  line L6 (0, -1.55) -> (0, -1.35)
  line L7 (7.2, -1.6) -> (0.05, -1.6)
  line L8 (2.6, 1.299) -> (0.2505, 1.299)
  line L9 (0.2505, -1.299) -> (2.6, -1.299)
  line L10 (2.6, -1.299) -> (2.6, -1.1)
  line L11 (2.6, 1.1) -> (2.6, 1.299)
  line L12 (6.9, 0.675) -> (2.8, 0.675)
  line L13 (2.8, 0.675) -> (2.8, 1.1)
  line L14 (2.8, 1.1) -> (2.6, 1.1)
  line L15 (2.6, -1.1) -> (2.8, -1.1)
  line L16 (2.8, -1.1) -> (2.8, -0.675)
  line L17 (2.8, -0.675) -> (6.9, -0.675)
  line L18 (12.85, -0.8) -> (12.2, -1.1626)
  line L19 (12.2, -1.1626) -> (7.2, -1.6)
  line L20 (7.1077, 1.6) -> (12.8824, 0.7109)
  arc A2 (12.85, -0.8) -> (12.8824, 0.7109) centre (10.7917, 0) ccw
  point P0 (0, 0)
  point P1 (7.012, 0)
  point P2 (0.7475, 1.75)
  point P3 (0.9775, 1.75)
  point P4 (1.2075, 1.75)
  point P5 (8.1591, 1.2076)
  point P6 (5.2803, 1.75)
  point P7 (6.0754, 1.75)
  point P8 (7.6761, 1.6296)
  point P9 (8.4815, 1.5119)
  point P10 (6.0591, 1.5)
  point P11 (10.1597, -0.9266)
  point P12 (9.6652, -1.2902)
  point P13 (8.8644, -1.3533)
  point P14 (7.2629, -1.4793)
  point P15 (9.3597, -0.9825)
  point P16 (3.3597, 1.4021)
  point P17 (4.1597, 1.3462)
  point P18 (6.5597, 1.1783)
  point P19 (7.3597, 1.1224)
  point P20 (8.1597, 1.0665)
  point P21 (9.7597, 0.9546)
  point P22 (10.5597, 0.8986)
  point P23 (10.9597, -0.8707)
  point P24 (8.5597, -1.0385)
  point P25 (7.7597, -1.0944)
  point P26 (6.9597, -1.1504)
  point P27 (5.3597, -1.2622)
  point P28 (4.5597, -1.3182)
  point P29 (3.7597, -1.3741)
  point P30 (2.9597, -1.4301)
  point P31 (3.3597, 1.4021)
  point P32 (9.6652, -1.2902)
  point P33 (10.5597, 0.8986)
  point P34 (8.9597, 0.8491)
  point P35 (10.5597, 0.7232)
  point P36 (6.5597, 1.038)
  point P37 (2.8826, 1.5)
  point P38 (3.6767, 1.5)
  point P39 (4.4708, 1.5)
  point P40 (5.2498, -1.5)
  point P41 (4.0738, -1.5)
  point P42 (3.2796, -1.5)
sketch "Sketch52" plane through (2.65, 0, 0) normal (-1, 0, 0) x (0, 0, 1)
  circle A0 centre (0, 0) radius 1.125
  dimension "d321" = 2.25
extrude "Extrusion21" [suppressed]
sketch "Sketch53" plane through (0, 0, 0) normal (0, 0, 1) x (1, 0, 0)
  line L0 (2.8, -0.75) -> (3.0165, -0.75)
  line L1 (2.8, -0.75) -> (2.8, -1.125)
  line L2 (2.8, -1.125) -> (3.0165, -0.75)
  line L3 (-2.6183, 0) -> (15.6376, 0)
  point P0 (0, 0)
  dimension "d325" = 1.125
  dimension "d326" = 0.75
  dimension "d327" = 60
  dimension "d328" = 2.8
revolve "Revolution7" [suppressed]
thread "Thread3"
sketch "Sketch54" plane through (0, 0, 0) normal (0, 1, 0) x (-1, 0, 0)
  line L0 (-13, 1.19) -> (-13, 0.25)
  line L1 (2.6183, 0) -> (-15.6376, 0)
  line L2 (0, 1.35) -> (0, -1.35)
  line L3 (-13, 0.25) -> (-12.6579, 1.19)
  line L4 (-12.6579, 1.19) -> (-13, 1.19)
  point P0 (0, 0)
  point P1 (-12.861, 0.9532)
  dimension "d341" = 13
  dimension "d342" = 0.94
  dimension "d343" = 20
  dimension "d344" = 0.25
revolve "Revolution8" [suppressed]
sketch "Sketch55" plane through (0.5216, 0, -1.4433) normal (0, 1, 0) x (1, 0, 0)
  line L0 (0.05, 0) -> (0.0827, 0.0567)
  line L1 (-0.0327, 0.0567) -> (0.0827, 0.0567)
  line L2 (-0.4716, 0.0567) -> (-0.0327, 0.0567)
  arc A0 (-0.4716, 0.0567) -> (-0.5216, 0.0067) centre (-0.4716, 0.0067) ccw
  line L3 (-0.5216, -0.0933) -> (-0.5216, 0.0067)
  line L4 (0.5843, -0.3183) -> (-0.5216, -0.0933)
  line L5 (6.3784, -0.6433) -> (2.2784, -0.6433)
  line L6 (6.8403, -1.4433) -> (6.3784, -0.6433)
  line L7 (6.3784, -2.2433) -> (6.8403, -1.4433)
  line L8 (2.2784, -2.2433) -> (6.3784, -2.2433)
  line L9 (-0.5216, -2.7933) -> (0.5843, -2.5683)
  line L10 (-0.5216, -2.8933) -> (-0.5216, -2.7933)
  arc A1 (-0.5216, -2.8933) -> (-0.4716, -2.9433) centre (-0.4716, -2.8933) ccw
  line L11 (0.5, 0) -> (0.55, 0)
  line L12 (1, 0) -> (1.05, 0)
  line L13 (1.5, 0) -> (1.55, 0)
  line L14 (1.3, -2.8866) -> (1.25, -2.8866)
  line L15 (0.8, -2.8866) -> (0.75, -2.8866)
  line L16 (0.3, -2.8866) -> (0.25, -2.8866)
  line L17 (0, 0) -> (0.05, 0)
  line L18 (-0.0327, 0.0567) -> (0, 0)
  line L19 (0.0827, 0.0567) -> (0.4673, 0.0567)
  line L20 (10.9407, -1.899) -> (3.9784, -2.9433)
  line L21 (0.5827, 0.0567) -> (0.9673, 0.0567)
  line L22 (1.0827, 0.0567) -> (1.4673, 0.0567)
  line L23 (1.5827, 0.0567) -> (6.4784, 0.0567)
  line L24 (0.2173, -2.9433) -> (-0.4716, -2.9433)
  line L25 (2.2784, -0.6433) -> (2.2784, -0.3433)
  line L26 (2.2784, -0.3433) -> (2.0784, -0.3433)
  line L27 (2.0784, -0.3433) -> (2.0784, -0.3183)
  line L28 (2.0784, -0.3183) -> (0.5843, -0.3183)
  line L29 (0.5843, -2.5683) -> (2.0784, -2.5683)
  line L30 (2.0784, -2.5683) -> (2.0784, -2.5433)
  line L31 (2.0784, -2.5433) -> (2.2784, -2.5433)
  line L32 (2.2784, -2.5433) -> (2.2784, -2.2433)
  line L33 (3.9784, -2.9433) -> (1.3327, -2.9433)
  line L34 (1.2173, -2.9433) -> (0.8327, -2.9433)
  line L35 (0.7173, -2.9433) -> (0.3327, -2.9433)
  line L36 (6.4784, 0.0567) -> (10.0076, -0.2521)
  line L37 (10.0076, -0.2521) -> (10.4686, -0.3904)
  line L38 (10.4686, -0.3904) -> (10.8284, -0.5433)
  arc A2 (10.9407, -1.899) -> (10.8284, -0.5433) centre (8.2034, -1.4433) ccw
  arc A3 (10.8284, -2.3433) -> (10.9407, -1.899) centre (8.2034, -1.4433) ccw
  line L39 (10.8284, -2.3433) -> (10.1784, -2.6196)
  line L40 (10.1784, -2.6196) -> (6.4784, -2.9433)
  line L41 (6.4784, -2.9433) -> (3.9784, -2.9433)
  point P0 (-0.5216, -1.4433)
  point P1 (0.2266, -3.3933)
  point P2 (0.4566, -3.3933)
  point P3 (0.6866, -3.3933)
  point P4 (0.9166, -3.3933)
  point P5 (1.1466, -3.3933)
  point P6 (1.3766, -3.3933)
  point P7 (5.6825, -3.3933)
  point P8 (0.3416, 0.1067)
  point P9 (0.5716, 0.1067)
  point P10 (11.0588, -2.5838)
  point P11 (1.6066, -3.3933)
  point P12 (6.4725, -3.3933)
  point P13 (5.7316, -2.8933)
  point P14 (8.1784, -2.422)
  point P15 (10.6381, -0.5366)
  point P16 (2.9784, -0.001)
  point P17 (9.3784, -0.6222)
  point P18 (7.7297, -0.0332)
  point P19 (8.5297, -0.0962)
  point P20 (7.8713, -2.7714)
  point P21 (6.2784, -2.8933)
extrude "Extrusion22" [suppressed]
sketch "Sketch56" plane through (2.0454, -0.6215, 0.2019) normal (0, -0.309, -0.9511) x (1, 0, 0)
  line L0 (-1.1738, 0.7898) -> (-1.1238, 0.7898)
  arc A0 (-1.9954, 0.8465) -> (-2.0454, 0.7965) centre (-1.9954, 0.7965) ccw
  line L1 (-2.0454, 0.6965) -> (-2.0454, 0.7965)
  line L2 (-1.063, 0.4967) -> (-2.0454, 0.6965)
  line L3 (4.8546, -1.4535) -> (5.3165, -0.6535)
  line L4 (5.3165, -0.6535) -> (4.8546, 0.1465)
  line L5 (-2.0454, -2.0035) -> (-1.063, -1.8036)
  line L6 (-2.0454, -2.1035) -> (-2.0454, -2.0035)
  arc A1 (-2.0454, -2.1035) -> (-1.9954, -2.1535) centre (-1.9954, -2.1035) ccw
  line L7 (-0.6738, 0.7898) -> (-0.6238, 0.7898)
  line L8 (-0.1738, 0.7898) -> (-0.1238, 0.7898)
  line L9 (-0.3738, -2.0968) -> (-0.4238, -2.0968)
  line L10 (-0.8738, -2.0968) -> (-0.9238, -2.0968)
  line L11 (-1.3738, -2.0968) -> (-1.4238, -2.0968)
  line L12 (0.159, -2.1535) -> (0.1262, -2.0968)
  line L13 (0.1262, -2.0968) -> (0.0762, -2.0968)
  line L14 (-0.091, 0.8465) -> (0.1785, 0.8465)
  line L15 (0.0435, -2.1535) -> (-0.341, -2.1535)
  line L16 (0.0762, -2.0968) -> (0.0435, -2.1535)
  line L17 (0.159, -2.1535) -> (0.0435, -2.1535)
  line L18 (0.5763, -2.1535) -> (0.159, -2.1535)
  line L19 (-1.4565, -2.1535) -> (-1.9954, -2.1535)
  line L20 (0.7546, -1.4535) -> (4.8546, -1.4535)
  line L21 (0.7546, 0.1465) -> (0.7546, 0.4465)
  line L22 (0.7546, 0.4465) -> (0.5546, 0.4465)
  line L23 (0.5546, 0.4465) -> (0.5546, 0.4967)
  line L24 (-1.9954, 0.8465) -> (-1.2065, 0.8465)
  line L25 (-1.091, 0.8465) -> (-0.7065, 0.8465)
  line L26 (-0.591, 0.8465) -> (-0.2065, 0.8465)
  line L27 (0.5546, -1.8036) -> (0.5546, -1.7535)
  line L28 (0.5546, -1.7535) -> (0.7546, -1.7535)
  line L29 (0.7546, -1.7535) -> (0.7546, -1.4535)
  line L30 (4.8546, 0.1465) -> (0.7546, 0.1465)
  line L31 (0.7231, 0.8465) -> (0.9741, 0.8465)
  line L32 (1.563, 0.8465) -> (1.7697, 0.8465)
  line L33 (2.4029, 0.8465) -> (2.5653, 0.8465)
  line L34 (3.2428, 0.8465) -> (3.3609, 0.8465)
  line L35 (4.0827, 0.8465) -> (4.1565, 0.8465)
  line L36 (2.1675, -2.1535) -> (1.983, -2.1535)
  line L37 (1.3719, -2.1535) -> (1.1431, -2.1535)
  line L38 (0.5546, 0.4967) -> (-1.063, 0.4967)
  line L39 (4.9226, 0.8465) -> (4.9521, 0.8465)
  line L40 (5.7151, 0.78) -> (5.7532, 0.7767)
  line L41 (6.5056, 0.7108) -> (6.5543, 0.7066)
  line L42 (7.2962, 0.6417) -> (7.3555, 0.6365)
  line L43 (8.0868, 0.5725) -> (8.1566, 0.5664)
  line L44 (8.8362, 0.4456) -> (8.966, 0.3905)
  arc A2 (9.4152, -1.1196) -> (9.3418, 0.1298) centre (6.6796, -0.6535) ccw
  line L45 (9.4152, -1.1196) -> (5.6437, -1.6979)
  line L46 (5.3826, -1.738) -> (5.0794, -1.7845)
  line L47 (4.5773, -1.8615) -> (4.3223, -1.9006)
  line L48 (3.772, -1.985) -> (3.5652, -2.0167)
  line L49 (2.9667, -2.1084) -> (2.8081, -2.1328)
  line L50 (-0.4565, -2.1535) -> (-0.841, -2.1535)
  line L51 (-0.9565, -2.1535) -> (-1.341, -2.1535)
  line L52 (-1.063, -1.8036) -> (0.5546, -1.8036)
  point P0 (-2.0454, -0.6535)
  point P1 (0.3989, 3.4635)
  point P2 (7.9, 3.2589)
  point P3 (2.9371, 3.5)
  point P4 (0.038, 3.4961)
  point P5 (8.3992, 2.4114)
  point P6 (-0.0008, 0.0012)
  point P7 (3.1992, 0.225)
  point P8 (7.465, 0.5622)
  point P9 (6.6601, 0.4594)
  point P10 (5.8552, 0.3565)
  point P11 (5.0502, 0.2537)
  point P12 (4.8225, 0.3444)
  point P13 (7.4574, 0.5612)
  point P14 (6.6533, 0.4585)
  point P15 (5.8491, 0.3557)
  point P16 (5.0449, 0.253)
  point P17 (5.4232, 2.9217)
  point P18 (6.2232, 2.8587)
  point P19 (7.0232, 2.7958)
  point P20 (8.6232, 2.6699)
  point P21 (5.4232, 2.9217)
  point P22 (0.1838, 0.7796)
  point P23 (0.9838, 0.7237)
  point P24 (0.6438, 0.7354)
  point P25 (1.4438, 0.6794)
  point P26 (1.7838, 0.6678)
  point P27 (2.2438, 0.6235)
  point P28 (2.5838, 0.6118)
  point P29 (3.0438, 0.5675)
  point P30 (3.3838, 0.5559)
  point P31 (3.8438, 0.5116)
  point P32 (4.1838, 0.4999)
  point P33 (4.6438, 0.4556)
  point P34 (4.9838, 0.444)
  point P35 (5.7838, 0.3881)
  point P36 (6.5838, 0.3321)
  point P37 (7.3838, 0.2762)
  point P38 (8.1838, 0.2202)
  point P39 (8.9838, 0.1643)
  point P40 (5.3838, -1.7229)
  point P41 (4.5838, -1.7789)
  point P42 (3.7838, -1.8348)
  point P43 (5.4438, 0.3997)
  point P44 (2.9838, -1.8908)
  point P45 (5.0438, -1.7346)
  point P46 (2.1838, -1.9467)
  point P47 (4.2438, -1.7905)
  point P48 (1.3838, -2.0027)
  point P49 (3.4438, -1.8465)
  point P50 (0.5838, -2.0586)
  point P51 (2.6438, -1.9024)
  point P52 (1.8438, -1.9584)
  point P53 (6.2438, 0.3438)
  point P54 (7.0438, 0.2878)
  point P55 (7.8438, 0.2319)
  point P56 (8.6438, 0.1759)
  point P57 (1.0438, -2.0143)
extrude "Extrusion23" [suppressed]
sketch "Sketch57" plane through (0.2505, -0.6495, 1.125) normal (0, 0, -1) x (-1, 0, 0)
  point P0 (0.2505, 0.6495)
sketch "Sketch58" plane through (2.1282, 0, 1.5) normal (0, -1, 0) x (1, 0, 0)
  line L0 (-0.0634, 0) -> (0.4723, 0)
  line L1 (-4.5095, -1.5) -> (12.087, -1.5)
  line L2 (-0.0426, -0.0738) -> (-0.0426, 0)
  line L3 (-0.0426, 0) -> (0, 0)
  line L4 (0.401, -0.1) -> (-0.059, -0.0557)
  line L5 (0.4723, 0) -> (0.401, -0.1)
  line L6 (-0.059, -0.0557) -> (-0.0634, 0)
  point P0 (-2.1282, -1.5)
revolve "Revolution9" [suppressed]
thread "Thread5"
sketch "Sketch59" plane through (2.0648, 0, 1.5) normal (0, -1, 0) x (1, 0, 0)
  line L0 (0, 0) -> (0.5357, 0)
  line L1 (0.0044, -0.0557) -> (0, 0)
  line L2 (0.4644, -0.1) -> (0.0044, -0.0557)
  line L3 (0.5357, 0) -> (0.4644, -0.1)
  line L4 (-4.7473, -1.5) -> (13.9575, -1.5)
  point P0 (-2.0648, -1.5)
revolve "Revolution10" [suppressed]
chamfer "Chamfer5" distance 0.2 angle 45 1 edges at (2.8, 0, 0.675)
properties part number "3.5X13 Implant" material "Titanium"
